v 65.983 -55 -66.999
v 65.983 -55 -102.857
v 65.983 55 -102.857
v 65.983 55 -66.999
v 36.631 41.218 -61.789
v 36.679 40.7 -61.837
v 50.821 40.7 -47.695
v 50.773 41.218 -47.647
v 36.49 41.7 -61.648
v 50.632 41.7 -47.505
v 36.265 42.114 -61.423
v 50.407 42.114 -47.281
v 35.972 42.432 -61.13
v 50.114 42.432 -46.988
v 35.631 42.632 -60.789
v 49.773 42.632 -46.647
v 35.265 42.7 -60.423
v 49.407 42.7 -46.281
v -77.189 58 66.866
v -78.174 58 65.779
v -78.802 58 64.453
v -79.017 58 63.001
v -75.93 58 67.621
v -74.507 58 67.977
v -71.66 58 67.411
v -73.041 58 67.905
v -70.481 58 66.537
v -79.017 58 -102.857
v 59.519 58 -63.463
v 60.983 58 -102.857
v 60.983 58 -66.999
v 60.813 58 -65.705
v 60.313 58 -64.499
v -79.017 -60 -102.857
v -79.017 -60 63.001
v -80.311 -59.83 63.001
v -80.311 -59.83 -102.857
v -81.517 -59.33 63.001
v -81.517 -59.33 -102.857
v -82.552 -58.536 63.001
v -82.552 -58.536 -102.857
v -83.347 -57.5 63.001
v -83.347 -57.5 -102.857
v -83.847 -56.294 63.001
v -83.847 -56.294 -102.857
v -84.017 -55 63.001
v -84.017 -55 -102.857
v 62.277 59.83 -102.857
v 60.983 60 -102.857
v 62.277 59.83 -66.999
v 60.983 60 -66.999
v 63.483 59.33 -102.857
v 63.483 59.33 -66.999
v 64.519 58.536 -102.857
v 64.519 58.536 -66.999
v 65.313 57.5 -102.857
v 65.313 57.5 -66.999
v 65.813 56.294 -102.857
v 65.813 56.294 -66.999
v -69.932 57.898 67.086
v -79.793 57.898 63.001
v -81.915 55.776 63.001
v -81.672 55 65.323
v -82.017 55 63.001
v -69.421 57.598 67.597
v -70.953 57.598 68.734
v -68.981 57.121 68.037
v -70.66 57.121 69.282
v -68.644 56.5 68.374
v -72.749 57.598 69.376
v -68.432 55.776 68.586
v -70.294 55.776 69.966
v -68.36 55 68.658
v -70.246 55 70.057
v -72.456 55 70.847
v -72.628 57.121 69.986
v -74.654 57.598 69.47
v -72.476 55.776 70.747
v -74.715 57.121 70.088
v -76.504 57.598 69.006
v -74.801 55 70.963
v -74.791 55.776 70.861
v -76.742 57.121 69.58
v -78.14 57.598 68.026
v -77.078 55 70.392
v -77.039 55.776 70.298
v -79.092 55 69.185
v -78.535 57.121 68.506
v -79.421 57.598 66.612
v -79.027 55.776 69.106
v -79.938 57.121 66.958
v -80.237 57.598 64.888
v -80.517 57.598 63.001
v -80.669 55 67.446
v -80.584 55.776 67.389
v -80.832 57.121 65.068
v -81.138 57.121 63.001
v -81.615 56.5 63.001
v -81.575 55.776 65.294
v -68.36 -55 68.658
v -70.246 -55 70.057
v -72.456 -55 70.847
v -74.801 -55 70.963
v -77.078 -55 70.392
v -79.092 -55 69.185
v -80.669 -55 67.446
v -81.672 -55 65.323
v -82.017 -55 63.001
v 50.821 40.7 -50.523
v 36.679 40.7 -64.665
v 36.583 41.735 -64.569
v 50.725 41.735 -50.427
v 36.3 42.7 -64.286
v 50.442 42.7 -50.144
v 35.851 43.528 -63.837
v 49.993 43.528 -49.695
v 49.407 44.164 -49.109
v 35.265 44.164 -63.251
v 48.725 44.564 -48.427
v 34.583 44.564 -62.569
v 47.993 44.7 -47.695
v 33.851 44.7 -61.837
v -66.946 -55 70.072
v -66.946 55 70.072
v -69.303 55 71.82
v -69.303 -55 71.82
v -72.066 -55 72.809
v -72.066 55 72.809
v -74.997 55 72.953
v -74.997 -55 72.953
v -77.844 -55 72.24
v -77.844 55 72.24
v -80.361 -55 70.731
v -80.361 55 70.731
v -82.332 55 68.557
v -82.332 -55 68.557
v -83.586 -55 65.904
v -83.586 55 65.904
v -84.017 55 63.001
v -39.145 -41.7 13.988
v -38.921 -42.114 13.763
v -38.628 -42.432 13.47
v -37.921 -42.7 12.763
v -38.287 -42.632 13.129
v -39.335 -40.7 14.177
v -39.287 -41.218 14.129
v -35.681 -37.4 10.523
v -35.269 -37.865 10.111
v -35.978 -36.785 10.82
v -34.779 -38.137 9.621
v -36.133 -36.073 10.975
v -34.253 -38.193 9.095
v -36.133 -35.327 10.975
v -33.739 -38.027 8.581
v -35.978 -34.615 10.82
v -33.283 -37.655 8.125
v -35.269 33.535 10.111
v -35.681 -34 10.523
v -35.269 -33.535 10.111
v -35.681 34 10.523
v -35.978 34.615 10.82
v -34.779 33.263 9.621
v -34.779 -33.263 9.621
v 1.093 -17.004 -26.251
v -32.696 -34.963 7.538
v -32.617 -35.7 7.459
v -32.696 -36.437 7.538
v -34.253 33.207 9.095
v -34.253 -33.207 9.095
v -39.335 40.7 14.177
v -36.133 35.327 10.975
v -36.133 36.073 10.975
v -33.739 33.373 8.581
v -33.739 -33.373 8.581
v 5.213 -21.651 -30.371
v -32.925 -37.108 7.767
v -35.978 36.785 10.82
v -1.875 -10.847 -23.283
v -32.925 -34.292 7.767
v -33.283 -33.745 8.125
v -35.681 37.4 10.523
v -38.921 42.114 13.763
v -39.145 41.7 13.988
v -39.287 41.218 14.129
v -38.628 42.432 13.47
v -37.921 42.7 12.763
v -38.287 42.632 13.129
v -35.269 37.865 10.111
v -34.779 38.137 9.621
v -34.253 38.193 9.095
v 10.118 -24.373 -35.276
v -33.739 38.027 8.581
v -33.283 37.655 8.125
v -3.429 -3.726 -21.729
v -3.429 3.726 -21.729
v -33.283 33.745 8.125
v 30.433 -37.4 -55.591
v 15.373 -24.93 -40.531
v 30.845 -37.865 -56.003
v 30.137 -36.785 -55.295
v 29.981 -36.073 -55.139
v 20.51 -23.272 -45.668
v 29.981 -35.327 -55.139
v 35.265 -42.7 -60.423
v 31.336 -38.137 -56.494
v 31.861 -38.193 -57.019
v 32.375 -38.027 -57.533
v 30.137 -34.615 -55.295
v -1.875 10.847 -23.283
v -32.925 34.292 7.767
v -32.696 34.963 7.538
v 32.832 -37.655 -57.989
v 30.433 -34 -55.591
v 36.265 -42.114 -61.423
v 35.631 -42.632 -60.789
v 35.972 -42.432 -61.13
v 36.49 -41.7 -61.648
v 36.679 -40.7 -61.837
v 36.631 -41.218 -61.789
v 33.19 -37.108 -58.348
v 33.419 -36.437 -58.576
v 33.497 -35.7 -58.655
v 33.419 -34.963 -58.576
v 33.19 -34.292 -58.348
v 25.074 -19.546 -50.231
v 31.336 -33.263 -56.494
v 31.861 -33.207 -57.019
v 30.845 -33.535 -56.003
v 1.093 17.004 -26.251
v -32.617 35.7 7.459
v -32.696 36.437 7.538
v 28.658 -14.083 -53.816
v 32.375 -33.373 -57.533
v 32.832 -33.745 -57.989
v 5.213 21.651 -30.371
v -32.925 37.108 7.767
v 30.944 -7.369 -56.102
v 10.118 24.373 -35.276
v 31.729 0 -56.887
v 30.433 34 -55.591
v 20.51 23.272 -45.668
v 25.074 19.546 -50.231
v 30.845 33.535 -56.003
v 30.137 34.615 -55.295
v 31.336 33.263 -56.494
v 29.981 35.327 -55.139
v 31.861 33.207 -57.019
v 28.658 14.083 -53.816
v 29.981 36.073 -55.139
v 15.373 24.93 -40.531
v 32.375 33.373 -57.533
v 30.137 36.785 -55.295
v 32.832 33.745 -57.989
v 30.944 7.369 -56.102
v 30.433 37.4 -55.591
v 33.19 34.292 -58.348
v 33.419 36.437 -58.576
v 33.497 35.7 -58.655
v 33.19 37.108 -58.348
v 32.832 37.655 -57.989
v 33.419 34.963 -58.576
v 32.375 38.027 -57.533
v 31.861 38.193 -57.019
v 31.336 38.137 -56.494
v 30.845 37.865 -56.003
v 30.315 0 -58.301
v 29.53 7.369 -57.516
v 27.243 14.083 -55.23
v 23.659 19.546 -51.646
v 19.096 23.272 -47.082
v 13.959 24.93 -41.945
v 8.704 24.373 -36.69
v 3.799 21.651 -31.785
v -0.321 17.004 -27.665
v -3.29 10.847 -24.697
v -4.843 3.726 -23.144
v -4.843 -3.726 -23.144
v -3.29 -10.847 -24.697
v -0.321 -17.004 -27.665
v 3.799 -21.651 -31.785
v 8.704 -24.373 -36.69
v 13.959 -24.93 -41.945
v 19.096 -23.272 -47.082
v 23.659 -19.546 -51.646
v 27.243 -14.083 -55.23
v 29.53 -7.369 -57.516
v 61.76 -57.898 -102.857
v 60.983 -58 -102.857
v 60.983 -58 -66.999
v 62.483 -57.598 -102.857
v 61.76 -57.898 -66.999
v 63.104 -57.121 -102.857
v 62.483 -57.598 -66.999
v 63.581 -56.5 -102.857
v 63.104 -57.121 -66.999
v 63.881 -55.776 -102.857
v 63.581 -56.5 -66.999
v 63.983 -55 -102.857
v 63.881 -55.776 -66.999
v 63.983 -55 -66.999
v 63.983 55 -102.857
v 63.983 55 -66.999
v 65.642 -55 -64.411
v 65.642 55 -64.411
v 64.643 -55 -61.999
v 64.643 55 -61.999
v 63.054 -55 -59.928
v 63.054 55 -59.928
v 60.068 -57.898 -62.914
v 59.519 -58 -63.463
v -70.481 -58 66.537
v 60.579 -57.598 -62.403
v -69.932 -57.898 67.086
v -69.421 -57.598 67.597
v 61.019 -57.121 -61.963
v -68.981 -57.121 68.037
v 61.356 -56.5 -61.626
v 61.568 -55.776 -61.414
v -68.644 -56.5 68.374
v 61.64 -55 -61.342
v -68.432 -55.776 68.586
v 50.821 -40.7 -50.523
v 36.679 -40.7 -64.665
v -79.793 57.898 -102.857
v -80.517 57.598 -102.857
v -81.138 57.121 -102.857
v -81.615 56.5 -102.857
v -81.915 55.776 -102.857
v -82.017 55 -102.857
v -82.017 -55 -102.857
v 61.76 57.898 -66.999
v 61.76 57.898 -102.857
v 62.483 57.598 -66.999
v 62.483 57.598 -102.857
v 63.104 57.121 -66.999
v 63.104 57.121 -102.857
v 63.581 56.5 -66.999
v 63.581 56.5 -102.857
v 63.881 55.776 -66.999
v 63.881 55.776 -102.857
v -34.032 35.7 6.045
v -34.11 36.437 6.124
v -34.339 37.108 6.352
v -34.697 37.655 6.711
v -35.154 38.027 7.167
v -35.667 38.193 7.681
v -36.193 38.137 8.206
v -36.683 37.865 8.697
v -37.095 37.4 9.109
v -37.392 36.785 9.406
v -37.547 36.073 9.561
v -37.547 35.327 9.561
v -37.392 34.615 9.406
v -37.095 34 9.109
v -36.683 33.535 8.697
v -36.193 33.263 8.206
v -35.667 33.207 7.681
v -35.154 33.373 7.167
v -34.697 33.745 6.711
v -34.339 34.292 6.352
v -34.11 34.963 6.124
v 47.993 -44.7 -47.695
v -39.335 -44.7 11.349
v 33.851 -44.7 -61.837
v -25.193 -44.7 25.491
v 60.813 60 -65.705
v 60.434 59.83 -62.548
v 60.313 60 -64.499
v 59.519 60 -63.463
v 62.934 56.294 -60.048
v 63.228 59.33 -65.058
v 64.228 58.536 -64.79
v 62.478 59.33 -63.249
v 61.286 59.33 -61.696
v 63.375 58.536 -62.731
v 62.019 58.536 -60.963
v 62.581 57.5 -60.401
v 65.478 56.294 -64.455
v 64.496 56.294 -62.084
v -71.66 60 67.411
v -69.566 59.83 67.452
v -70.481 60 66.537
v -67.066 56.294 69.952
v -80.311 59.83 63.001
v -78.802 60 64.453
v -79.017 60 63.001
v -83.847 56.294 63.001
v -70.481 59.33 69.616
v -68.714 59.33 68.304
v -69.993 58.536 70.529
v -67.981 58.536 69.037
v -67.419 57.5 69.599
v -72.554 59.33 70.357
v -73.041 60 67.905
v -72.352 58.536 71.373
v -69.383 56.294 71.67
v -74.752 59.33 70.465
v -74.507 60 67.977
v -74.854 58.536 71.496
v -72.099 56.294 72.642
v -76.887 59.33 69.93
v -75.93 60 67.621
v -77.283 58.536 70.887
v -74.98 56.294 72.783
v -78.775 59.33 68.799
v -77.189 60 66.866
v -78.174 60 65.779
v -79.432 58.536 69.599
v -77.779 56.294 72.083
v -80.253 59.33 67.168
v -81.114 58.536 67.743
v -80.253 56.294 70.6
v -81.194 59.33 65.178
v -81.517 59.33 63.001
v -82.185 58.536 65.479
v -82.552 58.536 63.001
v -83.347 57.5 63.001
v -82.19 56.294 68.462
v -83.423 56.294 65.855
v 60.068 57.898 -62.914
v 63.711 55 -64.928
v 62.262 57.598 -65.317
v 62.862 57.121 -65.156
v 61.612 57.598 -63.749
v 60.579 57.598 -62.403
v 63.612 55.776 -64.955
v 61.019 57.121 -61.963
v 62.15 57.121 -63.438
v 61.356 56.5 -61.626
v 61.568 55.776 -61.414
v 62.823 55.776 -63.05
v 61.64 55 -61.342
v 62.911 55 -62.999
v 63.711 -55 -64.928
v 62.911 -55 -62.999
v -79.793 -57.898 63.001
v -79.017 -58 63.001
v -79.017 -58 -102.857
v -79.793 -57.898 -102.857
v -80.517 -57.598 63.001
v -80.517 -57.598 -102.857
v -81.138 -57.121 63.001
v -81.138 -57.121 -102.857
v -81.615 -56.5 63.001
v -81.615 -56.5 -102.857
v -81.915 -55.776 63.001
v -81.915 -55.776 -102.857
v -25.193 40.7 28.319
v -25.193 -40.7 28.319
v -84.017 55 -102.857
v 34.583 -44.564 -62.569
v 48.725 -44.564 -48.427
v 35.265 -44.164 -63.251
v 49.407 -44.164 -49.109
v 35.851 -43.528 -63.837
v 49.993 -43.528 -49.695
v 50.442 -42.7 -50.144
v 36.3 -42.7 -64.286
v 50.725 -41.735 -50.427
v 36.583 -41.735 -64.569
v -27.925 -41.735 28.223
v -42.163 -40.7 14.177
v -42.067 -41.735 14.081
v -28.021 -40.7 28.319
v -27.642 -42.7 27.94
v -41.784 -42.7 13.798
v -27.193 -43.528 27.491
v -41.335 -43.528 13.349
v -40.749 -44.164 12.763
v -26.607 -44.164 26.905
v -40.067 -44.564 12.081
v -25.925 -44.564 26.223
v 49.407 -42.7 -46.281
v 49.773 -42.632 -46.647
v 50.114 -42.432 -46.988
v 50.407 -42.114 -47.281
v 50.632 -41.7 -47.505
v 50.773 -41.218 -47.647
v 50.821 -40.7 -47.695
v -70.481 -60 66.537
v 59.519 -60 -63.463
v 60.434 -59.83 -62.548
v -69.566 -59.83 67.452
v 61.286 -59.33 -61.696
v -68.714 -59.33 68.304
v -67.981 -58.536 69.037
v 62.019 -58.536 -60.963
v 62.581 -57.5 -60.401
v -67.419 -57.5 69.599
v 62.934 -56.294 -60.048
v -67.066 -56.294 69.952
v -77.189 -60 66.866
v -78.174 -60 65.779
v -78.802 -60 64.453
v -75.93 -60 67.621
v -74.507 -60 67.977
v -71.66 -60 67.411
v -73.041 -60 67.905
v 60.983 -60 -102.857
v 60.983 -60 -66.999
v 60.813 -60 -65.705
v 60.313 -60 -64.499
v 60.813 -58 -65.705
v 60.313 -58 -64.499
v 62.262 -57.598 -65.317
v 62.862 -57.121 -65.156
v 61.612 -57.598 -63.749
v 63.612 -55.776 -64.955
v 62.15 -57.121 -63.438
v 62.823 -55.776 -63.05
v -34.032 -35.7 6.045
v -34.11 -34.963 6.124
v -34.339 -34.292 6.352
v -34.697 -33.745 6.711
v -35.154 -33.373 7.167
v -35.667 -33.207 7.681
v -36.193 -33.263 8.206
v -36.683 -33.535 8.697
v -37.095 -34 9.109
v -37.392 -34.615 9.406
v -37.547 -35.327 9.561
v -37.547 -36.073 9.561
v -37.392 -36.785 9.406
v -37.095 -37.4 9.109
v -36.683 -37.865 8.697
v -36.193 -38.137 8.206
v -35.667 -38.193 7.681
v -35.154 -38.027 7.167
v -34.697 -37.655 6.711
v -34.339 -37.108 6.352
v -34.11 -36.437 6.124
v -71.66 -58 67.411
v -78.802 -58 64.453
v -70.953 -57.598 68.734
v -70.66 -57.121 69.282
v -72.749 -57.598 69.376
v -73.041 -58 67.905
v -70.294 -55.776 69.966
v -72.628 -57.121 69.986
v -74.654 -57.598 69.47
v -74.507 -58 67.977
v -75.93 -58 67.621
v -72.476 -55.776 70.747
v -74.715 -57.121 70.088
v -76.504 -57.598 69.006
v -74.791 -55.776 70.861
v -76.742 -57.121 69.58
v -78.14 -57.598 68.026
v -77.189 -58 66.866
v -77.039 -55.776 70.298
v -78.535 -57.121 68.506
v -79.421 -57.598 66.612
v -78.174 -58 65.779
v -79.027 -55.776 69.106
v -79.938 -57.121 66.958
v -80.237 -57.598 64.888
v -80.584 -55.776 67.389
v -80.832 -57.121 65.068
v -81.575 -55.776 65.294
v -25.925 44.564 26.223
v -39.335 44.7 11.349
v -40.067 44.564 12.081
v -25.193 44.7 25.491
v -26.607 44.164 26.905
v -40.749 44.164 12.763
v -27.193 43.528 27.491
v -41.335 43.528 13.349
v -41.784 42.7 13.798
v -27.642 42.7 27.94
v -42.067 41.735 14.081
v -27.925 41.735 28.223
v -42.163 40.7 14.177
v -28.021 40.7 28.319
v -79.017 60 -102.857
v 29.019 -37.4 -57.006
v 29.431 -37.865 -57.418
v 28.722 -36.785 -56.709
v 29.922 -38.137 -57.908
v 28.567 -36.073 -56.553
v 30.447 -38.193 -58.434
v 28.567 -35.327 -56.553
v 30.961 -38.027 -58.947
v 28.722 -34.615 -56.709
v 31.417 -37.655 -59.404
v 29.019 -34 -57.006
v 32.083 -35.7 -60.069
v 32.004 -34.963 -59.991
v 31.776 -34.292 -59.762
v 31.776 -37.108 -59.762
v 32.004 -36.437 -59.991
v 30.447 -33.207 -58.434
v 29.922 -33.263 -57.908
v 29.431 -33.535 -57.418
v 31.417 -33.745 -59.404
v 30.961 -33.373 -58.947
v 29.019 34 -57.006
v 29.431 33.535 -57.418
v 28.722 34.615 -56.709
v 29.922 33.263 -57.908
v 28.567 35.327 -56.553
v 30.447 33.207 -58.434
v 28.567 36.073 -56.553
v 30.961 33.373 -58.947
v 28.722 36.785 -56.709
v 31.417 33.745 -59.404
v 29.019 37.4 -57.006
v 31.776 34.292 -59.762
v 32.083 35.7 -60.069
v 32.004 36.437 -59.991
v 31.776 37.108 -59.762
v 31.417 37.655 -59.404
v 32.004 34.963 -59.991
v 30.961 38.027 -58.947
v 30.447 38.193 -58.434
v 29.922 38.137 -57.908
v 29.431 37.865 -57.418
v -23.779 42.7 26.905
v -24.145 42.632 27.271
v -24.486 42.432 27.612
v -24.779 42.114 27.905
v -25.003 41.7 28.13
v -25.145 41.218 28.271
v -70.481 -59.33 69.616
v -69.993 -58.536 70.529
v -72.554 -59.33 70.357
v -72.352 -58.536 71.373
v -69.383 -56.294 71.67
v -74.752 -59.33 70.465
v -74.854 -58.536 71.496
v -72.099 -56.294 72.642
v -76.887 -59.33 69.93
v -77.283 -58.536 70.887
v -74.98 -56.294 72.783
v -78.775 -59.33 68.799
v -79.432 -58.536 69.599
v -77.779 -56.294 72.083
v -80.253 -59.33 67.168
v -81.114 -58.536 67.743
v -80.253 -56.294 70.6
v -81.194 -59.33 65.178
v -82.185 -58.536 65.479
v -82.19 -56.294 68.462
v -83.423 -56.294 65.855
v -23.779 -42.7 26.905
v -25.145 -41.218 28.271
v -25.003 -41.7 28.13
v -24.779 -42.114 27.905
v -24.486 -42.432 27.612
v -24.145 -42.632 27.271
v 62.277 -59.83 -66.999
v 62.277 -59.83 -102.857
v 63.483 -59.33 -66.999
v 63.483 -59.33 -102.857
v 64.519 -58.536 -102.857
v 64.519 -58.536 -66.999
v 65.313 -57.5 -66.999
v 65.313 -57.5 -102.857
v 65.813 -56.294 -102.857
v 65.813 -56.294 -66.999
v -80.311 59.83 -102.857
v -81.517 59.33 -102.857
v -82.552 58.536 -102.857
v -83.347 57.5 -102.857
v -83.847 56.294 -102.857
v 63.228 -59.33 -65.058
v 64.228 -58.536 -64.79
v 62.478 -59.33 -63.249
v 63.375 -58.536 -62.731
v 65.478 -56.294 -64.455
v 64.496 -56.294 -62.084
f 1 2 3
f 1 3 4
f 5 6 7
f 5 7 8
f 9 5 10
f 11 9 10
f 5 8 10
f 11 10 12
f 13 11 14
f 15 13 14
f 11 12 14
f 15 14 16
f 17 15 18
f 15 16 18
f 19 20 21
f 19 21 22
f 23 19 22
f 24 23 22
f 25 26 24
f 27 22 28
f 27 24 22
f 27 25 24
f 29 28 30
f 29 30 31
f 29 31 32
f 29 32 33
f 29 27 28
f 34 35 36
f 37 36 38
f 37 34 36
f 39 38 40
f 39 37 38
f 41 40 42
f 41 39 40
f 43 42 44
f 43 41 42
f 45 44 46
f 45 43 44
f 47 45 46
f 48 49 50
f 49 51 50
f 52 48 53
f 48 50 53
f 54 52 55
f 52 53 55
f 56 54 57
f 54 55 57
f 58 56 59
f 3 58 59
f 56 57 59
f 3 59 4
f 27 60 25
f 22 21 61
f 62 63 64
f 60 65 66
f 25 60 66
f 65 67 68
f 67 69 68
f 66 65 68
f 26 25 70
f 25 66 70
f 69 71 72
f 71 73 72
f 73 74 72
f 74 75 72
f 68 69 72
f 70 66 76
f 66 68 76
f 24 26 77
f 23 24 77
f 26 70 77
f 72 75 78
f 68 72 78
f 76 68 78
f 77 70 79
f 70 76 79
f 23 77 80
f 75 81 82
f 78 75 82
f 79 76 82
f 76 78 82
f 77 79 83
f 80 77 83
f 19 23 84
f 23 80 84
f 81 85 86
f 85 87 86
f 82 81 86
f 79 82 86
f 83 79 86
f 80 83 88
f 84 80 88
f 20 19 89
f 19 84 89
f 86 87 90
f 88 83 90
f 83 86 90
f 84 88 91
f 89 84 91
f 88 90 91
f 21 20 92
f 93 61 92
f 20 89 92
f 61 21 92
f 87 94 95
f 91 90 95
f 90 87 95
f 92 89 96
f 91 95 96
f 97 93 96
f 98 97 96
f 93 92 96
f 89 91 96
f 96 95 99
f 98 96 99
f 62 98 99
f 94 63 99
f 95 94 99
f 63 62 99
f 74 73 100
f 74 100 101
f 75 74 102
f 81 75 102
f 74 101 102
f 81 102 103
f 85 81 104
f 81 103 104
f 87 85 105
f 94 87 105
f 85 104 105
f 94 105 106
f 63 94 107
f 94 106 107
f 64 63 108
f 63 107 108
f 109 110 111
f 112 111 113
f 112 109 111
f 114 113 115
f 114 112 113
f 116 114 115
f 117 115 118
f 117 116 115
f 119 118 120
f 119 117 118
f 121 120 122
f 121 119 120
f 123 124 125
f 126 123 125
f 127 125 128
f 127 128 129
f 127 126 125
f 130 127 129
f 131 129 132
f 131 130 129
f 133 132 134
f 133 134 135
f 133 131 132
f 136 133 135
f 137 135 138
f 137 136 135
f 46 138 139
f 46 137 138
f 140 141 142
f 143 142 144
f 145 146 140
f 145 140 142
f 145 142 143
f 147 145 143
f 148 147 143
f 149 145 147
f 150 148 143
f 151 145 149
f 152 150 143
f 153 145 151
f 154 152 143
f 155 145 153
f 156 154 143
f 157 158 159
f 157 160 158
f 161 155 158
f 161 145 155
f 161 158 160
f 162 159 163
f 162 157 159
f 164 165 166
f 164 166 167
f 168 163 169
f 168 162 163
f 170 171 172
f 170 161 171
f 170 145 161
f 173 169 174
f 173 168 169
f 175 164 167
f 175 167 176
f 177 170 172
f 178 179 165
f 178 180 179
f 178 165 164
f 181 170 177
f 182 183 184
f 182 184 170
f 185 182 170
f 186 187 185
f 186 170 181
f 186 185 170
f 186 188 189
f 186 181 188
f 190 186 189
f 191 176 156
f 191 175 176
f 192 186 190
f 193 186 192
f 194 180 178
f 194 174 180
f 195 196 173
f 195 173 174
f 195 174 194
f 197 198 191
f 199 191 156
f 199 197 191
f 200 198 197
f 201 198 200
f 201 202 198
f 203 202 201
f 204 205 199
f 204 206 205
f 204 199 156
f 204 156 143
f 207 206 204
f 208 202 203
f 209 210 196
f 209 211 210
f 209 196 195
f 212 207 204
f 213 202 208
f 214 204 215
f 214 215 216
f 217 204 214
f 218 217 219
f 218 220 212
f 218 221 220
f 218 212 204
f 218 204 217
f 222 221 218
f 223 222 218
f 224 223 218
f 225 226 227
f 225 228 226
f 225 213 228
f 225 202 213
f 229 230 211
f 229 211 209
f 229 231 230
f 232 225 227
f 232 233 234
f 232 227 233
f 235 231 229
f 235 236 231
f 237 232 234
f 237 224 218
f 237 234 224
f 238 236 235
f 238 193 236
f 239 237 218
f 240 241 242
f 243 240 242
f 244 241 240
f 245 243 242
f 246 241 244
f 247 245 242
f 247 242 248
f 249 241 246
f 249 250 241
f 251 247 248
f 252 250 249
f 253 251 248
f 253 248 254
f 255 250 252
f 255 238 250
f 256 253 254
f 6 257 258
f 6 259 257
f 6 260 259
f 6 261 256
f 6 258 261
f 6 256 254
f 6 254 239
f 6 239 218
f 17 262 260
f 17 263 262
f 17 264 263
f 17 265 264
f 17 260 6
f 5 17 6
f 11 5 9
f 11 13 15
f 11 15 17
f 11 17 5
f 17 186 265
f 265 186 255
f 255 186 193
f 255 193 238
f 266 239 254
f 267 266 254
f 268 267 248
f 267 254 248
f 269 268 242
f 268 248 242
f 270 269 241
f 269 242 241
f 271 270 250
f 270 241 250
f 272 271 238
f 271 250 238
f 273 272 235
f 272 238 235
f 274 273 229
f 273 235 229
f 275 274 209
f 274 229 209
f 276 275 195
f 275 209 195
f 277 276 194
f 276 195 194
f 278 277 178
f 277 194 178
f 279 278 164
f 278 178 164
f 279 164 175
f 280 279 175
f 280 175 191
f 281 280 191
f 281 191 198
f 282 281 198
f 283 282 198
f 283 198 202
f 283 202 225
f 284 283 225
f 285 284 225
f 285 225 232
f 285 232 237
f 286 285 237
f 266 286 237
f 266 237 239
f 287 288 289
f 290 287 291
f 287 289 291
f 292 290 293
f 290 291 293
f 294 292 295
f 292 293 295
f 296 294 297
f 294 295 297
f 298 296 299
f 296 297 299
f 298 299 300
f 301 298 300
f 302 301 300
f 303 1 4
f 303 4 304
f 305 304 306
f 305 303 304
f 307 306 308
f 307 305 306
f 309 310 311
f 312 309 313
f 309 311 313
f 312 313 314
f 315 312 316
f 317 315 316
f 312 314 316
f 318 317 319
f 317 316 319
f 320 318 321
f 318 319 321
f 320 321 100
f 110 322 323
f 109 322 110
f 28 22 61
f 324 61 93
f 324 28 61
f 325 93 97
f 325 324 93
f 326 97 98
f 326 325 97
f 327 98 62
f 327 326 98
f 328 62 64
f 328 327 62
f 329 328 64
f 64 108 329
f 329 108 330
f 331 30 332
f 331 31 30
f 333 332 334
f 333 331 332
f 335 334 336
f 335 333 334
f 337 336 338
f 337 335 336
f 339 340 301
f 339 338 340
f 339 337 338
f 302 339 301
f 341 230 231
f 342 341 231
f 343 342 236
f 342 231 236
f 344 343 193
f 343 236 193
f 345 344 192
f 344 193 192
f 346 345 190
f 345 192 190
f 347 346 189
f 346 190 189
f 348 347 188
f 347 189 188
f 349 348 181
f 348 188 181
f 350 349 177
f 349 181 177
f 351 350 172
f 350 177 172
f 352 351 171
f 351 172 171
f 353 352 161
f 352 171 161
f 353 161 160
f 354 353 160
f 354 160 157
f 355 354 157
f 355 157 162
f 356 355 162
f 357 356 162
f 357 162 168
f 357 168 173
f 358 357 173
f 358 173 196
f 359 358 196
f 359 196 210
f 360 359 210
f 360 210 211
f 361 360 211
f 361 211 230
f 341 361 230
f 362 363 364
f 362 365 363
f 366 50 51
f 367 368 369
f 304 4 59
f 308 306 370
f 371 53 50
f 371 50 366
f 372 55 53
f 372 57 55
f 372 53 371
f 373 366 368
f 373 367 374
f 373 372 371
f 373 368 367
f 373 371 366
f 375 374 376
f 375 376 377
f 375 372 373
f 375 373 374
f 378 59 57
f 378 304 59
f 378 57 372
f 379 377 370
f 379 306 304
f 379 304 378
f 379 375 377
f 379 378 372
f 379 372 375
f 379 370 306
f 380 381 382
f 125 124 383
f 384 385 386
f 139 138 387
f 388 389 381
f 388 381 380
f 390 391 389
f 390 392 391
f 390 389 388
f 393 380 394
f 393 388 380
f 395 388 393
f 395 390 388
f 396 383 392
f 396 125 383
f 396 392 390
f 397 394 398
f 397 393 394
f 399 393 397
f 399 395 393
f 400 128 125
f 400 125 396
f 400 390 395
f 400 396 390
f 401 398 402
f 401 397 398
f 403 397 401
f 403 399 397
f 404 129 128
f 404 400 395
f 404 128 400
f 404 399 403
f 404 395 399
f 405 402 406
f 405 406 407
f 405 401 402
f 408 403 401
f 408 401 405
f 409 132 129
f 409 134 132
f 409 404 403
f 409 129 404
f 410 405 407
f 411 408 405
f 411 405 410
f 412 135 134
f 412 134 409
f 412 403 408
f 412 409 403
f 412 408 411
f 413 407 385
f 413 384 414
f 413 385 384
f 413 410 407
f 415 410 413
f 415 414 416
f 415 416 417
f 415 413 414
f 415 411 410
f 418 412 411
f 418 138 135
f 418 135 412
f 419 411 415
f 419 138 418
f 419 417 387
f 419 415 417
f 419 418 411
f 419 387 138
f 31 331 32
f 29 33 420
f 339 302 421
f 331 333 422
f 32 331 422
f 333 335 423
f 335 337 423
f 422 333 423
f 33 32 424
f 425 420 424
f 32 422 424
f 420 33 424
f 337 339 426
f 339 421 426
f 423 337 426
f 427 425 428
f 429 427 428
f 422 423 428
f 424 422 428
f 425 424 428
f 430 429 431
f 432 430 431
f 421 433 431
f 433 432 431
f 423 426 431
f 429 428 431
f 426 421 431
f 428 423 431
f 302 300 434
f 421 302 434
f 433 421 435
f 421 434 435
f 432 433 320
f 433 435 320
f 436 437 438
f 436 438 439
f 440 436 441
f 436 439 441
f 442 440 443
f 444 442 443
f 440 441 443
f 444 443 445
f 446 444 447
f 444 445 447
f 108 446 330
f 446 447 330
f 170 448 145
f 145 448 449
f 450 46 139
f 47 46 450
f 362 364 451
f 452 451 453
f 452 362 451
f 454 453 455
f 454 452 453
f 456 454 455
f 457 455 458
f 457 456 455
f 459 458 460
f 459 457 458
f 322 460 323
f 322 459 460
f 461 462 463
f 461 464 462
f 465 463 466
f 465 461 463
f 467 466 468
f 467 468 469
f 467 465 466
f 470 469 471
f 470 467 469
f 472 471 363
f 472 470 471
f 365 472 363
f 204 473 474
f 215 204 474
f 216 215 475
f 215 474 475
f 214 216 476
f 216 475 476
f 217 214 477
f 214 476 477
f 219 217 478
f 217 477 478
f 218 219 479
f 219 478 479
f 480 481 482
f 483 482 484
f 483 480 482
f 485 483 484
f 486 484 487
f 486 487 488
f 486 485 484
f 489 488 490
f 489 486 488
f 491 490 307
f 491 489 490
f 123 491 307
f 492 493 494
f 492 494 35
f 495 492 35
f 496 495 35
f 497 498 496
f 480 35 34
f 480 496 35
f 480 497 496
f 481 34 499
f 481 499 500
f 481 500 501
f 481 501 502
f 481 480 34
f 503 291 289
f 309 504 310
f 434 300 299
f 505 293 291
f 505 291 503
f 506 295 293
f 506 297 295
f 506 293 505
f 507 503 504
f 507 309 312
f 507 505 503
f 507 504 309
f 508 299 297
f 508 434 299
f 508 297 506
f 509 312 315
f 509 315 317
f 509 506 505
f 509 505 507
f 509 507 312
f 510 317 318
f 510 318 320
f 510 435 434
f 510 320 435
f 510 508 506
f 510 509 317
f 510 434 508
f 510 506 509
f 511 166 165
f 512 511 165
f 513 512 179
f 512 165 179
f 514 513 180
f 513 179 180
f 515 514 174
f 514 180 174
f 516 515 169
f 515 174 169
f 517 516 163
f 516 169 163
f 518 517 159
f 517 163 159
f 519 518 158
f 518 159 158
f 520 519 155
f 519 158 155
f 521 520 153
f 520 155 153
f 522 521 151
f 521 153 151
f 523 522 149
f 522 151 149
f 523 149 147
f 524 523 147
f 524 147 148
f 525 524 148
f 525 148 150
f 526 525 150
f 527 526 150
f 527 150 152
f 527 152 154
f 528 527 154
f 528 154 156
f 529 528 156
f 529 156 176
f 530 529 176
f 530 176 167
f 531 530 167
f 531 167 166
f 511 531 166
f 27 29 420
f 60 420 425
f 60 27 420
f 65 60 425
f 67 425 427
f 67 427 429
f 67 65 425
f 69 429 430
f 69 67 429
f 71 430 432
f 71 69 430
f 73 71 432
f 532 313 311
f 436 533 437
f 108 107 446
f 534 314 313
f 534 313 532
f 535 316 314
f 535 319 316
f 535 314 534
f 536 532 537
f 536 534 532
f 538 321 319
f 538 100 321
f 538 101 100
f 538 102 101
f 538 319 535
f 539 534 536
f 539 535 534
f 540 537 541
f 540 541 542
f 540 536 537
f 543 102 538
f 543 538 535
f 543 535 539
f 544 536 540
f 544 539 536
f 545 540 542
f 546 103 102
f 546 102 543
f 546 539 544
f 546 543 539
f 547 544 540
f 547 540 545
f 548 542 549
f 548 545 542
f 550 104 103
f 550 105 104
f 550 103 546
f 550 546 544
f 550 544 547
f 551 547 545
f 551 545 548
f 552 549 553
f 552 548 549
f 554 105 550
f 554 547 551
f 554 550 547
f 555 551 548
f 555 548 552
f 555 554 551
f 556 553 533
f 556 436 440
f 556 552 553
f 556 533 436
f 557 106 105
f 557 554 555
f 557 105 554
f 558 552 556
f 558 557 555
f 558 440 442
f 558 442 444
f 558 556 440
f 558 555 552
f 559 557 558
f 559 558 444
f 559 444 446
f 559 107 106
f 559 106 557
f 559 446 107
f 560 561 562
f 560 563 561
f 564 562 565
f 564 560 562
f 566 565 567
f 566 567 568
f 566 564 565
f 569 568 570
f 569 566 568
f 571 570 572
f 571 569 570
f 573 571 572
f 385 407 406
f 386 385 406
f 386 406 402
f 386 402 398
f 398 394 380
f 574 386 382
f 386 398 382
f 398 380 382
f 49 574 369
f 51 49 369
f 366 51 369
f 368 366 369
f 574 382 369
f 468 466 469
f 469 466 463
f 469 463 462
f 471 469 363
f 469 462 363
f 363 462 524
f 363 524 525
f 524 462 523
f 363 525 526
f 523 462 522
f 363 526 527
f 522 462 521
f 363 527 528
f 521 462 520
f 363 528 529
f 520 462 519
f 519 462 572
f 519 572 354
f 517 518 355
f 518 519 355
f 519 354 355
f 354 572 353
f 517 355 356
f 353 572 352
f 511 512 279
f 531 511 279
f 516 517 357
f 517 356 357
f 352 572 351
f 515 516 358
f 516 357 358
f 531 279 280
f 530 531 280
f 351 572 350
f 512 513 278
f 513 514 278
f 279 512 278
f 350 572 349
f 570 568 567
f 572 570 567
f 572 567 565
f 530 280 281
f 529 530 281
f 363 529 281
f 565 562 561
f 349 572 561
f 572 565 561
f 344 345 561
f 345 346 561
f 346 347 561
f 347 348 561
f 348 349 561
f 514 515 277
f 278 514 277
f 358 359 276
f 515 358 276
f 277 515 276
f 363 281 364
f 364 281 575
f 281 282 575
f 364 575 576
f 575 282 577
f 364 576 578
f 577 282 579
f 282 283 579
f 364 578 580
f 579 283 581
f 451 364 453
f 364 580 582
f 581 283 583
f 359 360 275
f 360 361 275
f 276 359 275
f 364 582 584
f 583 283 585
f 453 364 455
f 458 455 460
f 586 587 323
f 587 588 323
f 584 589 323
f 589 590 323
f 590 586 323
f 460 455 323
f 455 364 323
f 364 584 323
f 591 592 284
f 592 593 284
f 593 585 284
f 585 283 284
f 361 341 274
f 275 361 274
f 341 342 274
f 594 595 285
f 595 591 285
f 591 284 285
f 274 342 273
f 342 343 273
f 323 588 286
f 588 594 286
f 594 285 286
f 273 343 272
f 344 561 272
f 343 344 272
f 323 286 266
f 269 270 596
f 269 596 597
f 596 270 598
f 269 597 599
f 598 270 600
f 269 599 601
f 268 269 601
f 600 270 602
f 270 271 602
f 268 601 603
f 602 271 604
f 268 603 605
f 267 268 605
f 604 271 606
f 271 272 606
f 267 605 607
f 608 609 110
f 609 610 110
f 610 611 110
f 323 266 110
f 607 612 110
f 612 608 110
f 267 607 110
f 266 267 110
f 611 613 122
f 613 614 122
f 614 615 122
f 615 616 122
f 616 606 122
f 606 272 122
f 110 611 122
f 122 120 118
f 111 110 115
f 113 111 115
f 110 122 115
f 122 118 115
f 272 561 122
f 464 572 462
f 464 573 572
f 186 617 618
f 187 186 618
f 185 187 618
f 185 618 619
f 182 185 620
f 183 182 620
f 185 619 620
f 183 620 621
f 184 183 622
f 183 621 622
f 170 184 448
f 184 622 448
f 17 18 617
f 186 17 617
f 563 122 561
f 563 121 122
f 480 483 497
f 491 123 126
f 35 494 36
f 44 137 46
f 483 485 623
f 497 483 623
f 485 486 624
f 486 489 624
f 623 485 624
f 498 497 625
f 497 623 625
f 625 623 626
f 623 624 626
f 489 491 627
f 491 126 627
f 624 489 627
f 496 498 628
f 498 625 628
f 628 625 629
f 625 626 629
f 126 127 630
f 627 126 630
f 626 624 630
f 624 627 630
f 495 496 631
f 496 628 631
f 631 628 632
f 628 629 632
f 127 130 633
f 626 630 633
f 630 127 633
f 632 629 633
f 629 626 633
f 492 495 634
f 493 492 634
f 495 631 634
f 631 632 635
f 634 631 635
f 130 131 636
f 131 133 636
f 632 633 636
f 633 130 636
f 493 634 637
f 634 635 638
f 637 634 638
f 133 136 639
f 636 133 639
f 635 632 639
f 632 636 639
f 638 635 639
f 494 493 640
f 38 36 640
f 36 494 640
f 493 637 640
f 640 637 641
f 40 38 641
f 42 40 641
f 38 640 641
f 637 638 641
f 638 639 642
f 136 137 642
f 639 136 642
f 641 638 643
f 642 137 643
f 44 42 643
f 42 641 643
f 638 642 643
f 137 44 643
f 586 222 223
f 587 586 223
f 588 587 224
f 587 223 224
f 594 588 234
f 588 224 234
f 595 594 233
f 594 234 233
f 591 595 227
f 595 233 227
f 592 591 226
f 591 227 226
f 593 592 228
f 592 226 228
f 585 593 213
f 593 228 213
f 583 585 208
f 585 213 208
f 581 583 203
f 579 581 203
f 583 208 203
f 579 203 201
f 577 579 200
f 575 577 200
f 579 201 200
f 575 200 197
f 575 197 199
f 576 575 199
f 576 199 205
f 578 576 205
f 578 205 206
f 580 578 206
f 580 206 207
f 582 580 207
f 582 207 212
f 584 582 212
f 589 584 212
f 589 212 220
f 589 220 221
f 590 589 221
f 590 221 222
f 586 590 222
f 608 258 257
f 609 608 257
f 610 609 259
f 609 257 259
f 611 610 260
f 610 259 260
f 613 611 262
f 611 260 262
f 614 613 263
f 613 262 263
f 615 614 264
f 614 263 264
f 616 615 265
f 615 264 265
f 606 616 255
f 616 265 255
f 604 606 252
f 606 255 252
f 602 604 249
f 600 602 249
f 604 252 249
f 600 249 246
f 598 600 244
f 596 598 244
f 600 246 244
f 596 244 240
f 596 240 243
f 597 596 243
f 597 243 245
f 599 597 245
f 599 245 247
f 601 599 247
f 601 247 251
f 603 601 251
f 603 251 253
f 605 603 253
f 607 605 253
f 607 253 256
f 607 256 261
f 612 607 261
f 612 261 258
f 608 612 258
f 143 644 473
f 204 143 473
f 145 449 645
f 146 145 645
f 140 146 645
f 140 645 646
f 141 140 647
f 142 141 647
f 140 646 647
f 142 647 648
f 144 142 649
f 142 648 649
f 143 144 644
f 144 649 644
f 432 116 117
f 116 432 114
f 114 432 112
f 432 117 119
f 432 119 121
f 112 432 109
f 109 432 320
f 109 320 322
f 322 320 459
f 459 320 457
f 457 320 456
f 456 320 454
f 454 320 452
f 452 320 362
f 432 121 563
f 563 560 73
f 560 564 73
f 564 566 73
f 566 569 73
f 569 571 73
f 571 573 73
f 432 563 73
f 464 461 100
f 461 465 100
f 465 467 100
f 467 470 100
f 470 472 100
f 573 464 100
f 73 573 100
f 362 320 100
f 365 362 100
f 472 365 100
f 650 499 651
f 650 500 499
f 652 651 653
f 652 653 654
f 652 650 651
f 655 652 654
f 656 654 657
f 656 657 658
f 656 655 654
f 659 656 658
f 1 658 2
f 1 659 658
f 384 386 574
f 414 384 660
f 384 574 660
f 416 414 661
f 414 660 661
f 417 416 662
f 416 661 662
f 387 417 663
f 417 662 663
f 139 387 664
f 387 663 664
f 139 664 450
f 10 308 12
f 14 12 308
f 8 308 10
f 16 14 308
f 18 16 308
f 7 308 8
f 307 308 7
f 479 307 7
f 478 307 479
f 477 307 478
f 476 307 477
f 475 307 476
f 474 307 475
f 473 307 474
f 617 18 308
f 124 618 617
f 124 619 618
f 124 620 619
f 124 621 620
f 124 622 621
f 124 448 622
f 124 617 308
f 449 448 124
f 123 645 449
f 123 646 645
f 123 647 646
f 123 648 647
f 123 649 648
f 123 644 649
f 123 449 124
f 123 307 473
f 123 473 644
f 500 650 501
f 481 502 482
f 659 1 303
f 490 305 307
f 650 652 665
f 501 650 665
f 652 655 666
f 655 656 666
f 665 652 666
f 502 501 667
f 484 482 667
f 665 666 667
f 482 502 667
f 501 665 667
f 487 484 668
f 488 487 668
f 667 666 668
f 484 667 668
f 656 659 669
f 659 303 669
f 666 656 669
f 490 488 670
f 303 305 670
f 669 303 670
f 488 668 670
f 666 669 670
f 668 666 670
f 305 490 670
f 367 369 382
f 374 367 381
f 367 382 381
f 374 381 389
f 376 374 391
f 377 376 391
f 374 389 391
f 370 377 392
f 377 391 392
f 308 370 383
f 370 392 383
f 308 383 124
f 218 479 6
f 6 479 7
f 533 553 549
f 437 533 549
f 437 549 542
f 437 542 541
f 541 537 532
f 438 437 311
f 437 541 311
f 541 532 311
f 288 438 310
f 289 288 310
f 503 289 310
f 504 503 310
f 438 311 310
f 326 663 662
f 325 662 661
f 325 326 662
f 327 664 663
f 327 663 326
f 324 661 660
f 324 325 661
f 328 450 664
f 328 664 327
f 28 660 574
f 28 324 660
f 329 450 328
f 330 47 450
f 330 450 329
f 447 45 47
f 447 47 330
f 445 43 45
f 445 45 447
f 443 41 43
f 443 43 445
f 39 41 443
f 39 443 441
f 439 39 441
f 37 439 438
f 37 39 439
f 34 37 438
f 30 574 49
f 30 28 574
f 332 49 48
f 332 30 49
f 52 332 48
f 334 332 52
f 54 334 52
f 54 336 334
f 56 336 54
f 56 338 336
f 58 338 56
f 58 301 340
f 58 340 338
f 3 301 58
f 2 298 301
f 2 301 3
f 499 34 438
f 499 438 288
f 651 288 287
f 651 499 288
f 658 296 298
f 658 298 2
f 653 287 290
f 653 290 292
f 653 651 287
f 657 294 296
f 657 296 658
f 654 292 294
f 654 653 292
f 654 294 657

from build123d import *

# Parameters (mm, degrees)
F1_DEPTH = 60
F2_R     = 2.5
F2_R_2   = 25
F3_DEPTH = 20
F4_R     = 5
F5_T     = -2
F6_DEPTH = 25


with BuildPart() as f1:
    # F0 (on Front) → F1 (new body, symmetric)
    with BuildSketch(Plane.XZ):
        with BuildLine():
            Line((-84.0168925865, 63.0011496848), (-84.0168925865, -102.8567146915))
            Line((-84.0168925865, -102.8567146915), (65.9831074135, -102.8567146915))
            Line((65.9831074135, -102.8567146915), (65.9831074135, -66.9988503152))
            ThreePointArc((65.9831074135, -66.9988503152), (65.2219027386, -63.1720159916), (63.0541752254, -59.9277825033))
            Line((63.0541752254, -59.9277825033), (-66.9458247746, 70.0722174967))
            ThreePointArc((-66.9458247746, 70.0722174967), (-77.8437269101, 72.2399450099), (-84.0168925865, 63.0011496848))
        make_face()
    extrude(amount=F1_DEPTH, both=True)

    # F2 (on face) → F3 (cut)
    with BuildSketch(Plane(origin=(1.563196361, 0, 1.563196361), x_dir=(0.7071067812, 0, -0.7071067812), z_dir=(0.7071067812, 0, 0.7071067812))):
        with BuildLine():
            ThreePointArc((69.6613762736, 40.7), (69.0755898359, 42.1142135624), (67.6613762736, 42.7))
            Line((67.6613762736, 42.7), (-35.8386237264, 42.7))
            ThreePointArc((-35.8386237264, 42.7), (-37.2528372888, 42.1142135624), (-37.8386237264, 40.7))
            Line((-37.8386237264, 40.7), (-37.8386237264, -40.7))
            ThreePointArc((-37.8386237264, -40.7), (-37.2528372888, -42.1142135624), (-35.8386237264, -42.7))
            Line((-35.8386237264, -42.7), (67.6613762736, -42.7))
            ThreePointArc((67.6613762736, -42.7), (69.0755898359, -42.1142135624), (69.6613762736, -40.7))
            Line((69.6613762736, -40.7), (69.6613762736, 40.7))
        make_face()
        with Locations((-30.8386237264, -35.7)):
            Circle(F2_R, mode=Mode.SUBTRACT)
        with Locations((62.6613762736, -35.7)):
            Circle(F2_R, mode=Mode.SUBTRACT)
        with Locations((-30.8386237264, 35.7)):
            Circle(F2_R, mode=Mode.SUBTRACT)
        with Locations((37.6613762736, 0)):
            Circle(F2_R_2, mode=Mode.SUBTRACT)
        with Locations((62.6613762736, 35.7)):
            Circle(F2_R, mode=Mode.SUBTRACT)
        with Locations((37.6613762736, 0)):
            Circle(F2_R_2)
        with Locations((-30.8386237264, 35.7)):
            Circle(F2_R)
        with Locations((62.6613762736, 35.7)):
            Circle(F2_R)
        with Locations((62.6613762736, -35.7)):
            Circle(F2_R)
        with Locations((-30.8386237264, -35.7)):
            Circle(F2_R)
    extrude(amount=-F3_DEPTH, mode=Mode.SUBTRACT)

    # F4
    f4_edges = [f1.edges().sort_by_distance(p)[0] for p in [
        (-1.945825, 60, 5.072217),
        (-1.945825, -60, 5.072217),
    ]]
    fillet(f4_edges, radius=F4_R)

    # F5
    f5_openings = [f1.faces().sort_by_distance(p)[0] for p in [
        (-9.016893, 0, -102.856715),
    ]]
    offset(amount=F5_T, openings=f5_openings, kind=Kind.INTERSECTION)

    # F2 (on face) → F6 (cut)
    with BuildSketch(Plane(origin=(1.563196361, 0, 1.563196361), x_dir=(0.7071067812, 0, -0.7071067812), z_dir=(0.7071067812, 0, 0.7071067812))):
        with Locations((37.6613762736, 0)):
            Circle(F2_R_2)
        with Locations((-30.8386237264, 35.7)):
            Circle(F2_R)
        with Locations((-30.8386237264, -35.7)):
            Circle(F2_R)
        with Locations((62.6613762736, 35.7)):
            Circle(F2_R)
        with Locations((62.6613762736, -35.7)):
            Circle(F2_R)
    extrude(amount=-F6_DEPTH, mode=Mode.SUBTRACT)


solid = f1.part
